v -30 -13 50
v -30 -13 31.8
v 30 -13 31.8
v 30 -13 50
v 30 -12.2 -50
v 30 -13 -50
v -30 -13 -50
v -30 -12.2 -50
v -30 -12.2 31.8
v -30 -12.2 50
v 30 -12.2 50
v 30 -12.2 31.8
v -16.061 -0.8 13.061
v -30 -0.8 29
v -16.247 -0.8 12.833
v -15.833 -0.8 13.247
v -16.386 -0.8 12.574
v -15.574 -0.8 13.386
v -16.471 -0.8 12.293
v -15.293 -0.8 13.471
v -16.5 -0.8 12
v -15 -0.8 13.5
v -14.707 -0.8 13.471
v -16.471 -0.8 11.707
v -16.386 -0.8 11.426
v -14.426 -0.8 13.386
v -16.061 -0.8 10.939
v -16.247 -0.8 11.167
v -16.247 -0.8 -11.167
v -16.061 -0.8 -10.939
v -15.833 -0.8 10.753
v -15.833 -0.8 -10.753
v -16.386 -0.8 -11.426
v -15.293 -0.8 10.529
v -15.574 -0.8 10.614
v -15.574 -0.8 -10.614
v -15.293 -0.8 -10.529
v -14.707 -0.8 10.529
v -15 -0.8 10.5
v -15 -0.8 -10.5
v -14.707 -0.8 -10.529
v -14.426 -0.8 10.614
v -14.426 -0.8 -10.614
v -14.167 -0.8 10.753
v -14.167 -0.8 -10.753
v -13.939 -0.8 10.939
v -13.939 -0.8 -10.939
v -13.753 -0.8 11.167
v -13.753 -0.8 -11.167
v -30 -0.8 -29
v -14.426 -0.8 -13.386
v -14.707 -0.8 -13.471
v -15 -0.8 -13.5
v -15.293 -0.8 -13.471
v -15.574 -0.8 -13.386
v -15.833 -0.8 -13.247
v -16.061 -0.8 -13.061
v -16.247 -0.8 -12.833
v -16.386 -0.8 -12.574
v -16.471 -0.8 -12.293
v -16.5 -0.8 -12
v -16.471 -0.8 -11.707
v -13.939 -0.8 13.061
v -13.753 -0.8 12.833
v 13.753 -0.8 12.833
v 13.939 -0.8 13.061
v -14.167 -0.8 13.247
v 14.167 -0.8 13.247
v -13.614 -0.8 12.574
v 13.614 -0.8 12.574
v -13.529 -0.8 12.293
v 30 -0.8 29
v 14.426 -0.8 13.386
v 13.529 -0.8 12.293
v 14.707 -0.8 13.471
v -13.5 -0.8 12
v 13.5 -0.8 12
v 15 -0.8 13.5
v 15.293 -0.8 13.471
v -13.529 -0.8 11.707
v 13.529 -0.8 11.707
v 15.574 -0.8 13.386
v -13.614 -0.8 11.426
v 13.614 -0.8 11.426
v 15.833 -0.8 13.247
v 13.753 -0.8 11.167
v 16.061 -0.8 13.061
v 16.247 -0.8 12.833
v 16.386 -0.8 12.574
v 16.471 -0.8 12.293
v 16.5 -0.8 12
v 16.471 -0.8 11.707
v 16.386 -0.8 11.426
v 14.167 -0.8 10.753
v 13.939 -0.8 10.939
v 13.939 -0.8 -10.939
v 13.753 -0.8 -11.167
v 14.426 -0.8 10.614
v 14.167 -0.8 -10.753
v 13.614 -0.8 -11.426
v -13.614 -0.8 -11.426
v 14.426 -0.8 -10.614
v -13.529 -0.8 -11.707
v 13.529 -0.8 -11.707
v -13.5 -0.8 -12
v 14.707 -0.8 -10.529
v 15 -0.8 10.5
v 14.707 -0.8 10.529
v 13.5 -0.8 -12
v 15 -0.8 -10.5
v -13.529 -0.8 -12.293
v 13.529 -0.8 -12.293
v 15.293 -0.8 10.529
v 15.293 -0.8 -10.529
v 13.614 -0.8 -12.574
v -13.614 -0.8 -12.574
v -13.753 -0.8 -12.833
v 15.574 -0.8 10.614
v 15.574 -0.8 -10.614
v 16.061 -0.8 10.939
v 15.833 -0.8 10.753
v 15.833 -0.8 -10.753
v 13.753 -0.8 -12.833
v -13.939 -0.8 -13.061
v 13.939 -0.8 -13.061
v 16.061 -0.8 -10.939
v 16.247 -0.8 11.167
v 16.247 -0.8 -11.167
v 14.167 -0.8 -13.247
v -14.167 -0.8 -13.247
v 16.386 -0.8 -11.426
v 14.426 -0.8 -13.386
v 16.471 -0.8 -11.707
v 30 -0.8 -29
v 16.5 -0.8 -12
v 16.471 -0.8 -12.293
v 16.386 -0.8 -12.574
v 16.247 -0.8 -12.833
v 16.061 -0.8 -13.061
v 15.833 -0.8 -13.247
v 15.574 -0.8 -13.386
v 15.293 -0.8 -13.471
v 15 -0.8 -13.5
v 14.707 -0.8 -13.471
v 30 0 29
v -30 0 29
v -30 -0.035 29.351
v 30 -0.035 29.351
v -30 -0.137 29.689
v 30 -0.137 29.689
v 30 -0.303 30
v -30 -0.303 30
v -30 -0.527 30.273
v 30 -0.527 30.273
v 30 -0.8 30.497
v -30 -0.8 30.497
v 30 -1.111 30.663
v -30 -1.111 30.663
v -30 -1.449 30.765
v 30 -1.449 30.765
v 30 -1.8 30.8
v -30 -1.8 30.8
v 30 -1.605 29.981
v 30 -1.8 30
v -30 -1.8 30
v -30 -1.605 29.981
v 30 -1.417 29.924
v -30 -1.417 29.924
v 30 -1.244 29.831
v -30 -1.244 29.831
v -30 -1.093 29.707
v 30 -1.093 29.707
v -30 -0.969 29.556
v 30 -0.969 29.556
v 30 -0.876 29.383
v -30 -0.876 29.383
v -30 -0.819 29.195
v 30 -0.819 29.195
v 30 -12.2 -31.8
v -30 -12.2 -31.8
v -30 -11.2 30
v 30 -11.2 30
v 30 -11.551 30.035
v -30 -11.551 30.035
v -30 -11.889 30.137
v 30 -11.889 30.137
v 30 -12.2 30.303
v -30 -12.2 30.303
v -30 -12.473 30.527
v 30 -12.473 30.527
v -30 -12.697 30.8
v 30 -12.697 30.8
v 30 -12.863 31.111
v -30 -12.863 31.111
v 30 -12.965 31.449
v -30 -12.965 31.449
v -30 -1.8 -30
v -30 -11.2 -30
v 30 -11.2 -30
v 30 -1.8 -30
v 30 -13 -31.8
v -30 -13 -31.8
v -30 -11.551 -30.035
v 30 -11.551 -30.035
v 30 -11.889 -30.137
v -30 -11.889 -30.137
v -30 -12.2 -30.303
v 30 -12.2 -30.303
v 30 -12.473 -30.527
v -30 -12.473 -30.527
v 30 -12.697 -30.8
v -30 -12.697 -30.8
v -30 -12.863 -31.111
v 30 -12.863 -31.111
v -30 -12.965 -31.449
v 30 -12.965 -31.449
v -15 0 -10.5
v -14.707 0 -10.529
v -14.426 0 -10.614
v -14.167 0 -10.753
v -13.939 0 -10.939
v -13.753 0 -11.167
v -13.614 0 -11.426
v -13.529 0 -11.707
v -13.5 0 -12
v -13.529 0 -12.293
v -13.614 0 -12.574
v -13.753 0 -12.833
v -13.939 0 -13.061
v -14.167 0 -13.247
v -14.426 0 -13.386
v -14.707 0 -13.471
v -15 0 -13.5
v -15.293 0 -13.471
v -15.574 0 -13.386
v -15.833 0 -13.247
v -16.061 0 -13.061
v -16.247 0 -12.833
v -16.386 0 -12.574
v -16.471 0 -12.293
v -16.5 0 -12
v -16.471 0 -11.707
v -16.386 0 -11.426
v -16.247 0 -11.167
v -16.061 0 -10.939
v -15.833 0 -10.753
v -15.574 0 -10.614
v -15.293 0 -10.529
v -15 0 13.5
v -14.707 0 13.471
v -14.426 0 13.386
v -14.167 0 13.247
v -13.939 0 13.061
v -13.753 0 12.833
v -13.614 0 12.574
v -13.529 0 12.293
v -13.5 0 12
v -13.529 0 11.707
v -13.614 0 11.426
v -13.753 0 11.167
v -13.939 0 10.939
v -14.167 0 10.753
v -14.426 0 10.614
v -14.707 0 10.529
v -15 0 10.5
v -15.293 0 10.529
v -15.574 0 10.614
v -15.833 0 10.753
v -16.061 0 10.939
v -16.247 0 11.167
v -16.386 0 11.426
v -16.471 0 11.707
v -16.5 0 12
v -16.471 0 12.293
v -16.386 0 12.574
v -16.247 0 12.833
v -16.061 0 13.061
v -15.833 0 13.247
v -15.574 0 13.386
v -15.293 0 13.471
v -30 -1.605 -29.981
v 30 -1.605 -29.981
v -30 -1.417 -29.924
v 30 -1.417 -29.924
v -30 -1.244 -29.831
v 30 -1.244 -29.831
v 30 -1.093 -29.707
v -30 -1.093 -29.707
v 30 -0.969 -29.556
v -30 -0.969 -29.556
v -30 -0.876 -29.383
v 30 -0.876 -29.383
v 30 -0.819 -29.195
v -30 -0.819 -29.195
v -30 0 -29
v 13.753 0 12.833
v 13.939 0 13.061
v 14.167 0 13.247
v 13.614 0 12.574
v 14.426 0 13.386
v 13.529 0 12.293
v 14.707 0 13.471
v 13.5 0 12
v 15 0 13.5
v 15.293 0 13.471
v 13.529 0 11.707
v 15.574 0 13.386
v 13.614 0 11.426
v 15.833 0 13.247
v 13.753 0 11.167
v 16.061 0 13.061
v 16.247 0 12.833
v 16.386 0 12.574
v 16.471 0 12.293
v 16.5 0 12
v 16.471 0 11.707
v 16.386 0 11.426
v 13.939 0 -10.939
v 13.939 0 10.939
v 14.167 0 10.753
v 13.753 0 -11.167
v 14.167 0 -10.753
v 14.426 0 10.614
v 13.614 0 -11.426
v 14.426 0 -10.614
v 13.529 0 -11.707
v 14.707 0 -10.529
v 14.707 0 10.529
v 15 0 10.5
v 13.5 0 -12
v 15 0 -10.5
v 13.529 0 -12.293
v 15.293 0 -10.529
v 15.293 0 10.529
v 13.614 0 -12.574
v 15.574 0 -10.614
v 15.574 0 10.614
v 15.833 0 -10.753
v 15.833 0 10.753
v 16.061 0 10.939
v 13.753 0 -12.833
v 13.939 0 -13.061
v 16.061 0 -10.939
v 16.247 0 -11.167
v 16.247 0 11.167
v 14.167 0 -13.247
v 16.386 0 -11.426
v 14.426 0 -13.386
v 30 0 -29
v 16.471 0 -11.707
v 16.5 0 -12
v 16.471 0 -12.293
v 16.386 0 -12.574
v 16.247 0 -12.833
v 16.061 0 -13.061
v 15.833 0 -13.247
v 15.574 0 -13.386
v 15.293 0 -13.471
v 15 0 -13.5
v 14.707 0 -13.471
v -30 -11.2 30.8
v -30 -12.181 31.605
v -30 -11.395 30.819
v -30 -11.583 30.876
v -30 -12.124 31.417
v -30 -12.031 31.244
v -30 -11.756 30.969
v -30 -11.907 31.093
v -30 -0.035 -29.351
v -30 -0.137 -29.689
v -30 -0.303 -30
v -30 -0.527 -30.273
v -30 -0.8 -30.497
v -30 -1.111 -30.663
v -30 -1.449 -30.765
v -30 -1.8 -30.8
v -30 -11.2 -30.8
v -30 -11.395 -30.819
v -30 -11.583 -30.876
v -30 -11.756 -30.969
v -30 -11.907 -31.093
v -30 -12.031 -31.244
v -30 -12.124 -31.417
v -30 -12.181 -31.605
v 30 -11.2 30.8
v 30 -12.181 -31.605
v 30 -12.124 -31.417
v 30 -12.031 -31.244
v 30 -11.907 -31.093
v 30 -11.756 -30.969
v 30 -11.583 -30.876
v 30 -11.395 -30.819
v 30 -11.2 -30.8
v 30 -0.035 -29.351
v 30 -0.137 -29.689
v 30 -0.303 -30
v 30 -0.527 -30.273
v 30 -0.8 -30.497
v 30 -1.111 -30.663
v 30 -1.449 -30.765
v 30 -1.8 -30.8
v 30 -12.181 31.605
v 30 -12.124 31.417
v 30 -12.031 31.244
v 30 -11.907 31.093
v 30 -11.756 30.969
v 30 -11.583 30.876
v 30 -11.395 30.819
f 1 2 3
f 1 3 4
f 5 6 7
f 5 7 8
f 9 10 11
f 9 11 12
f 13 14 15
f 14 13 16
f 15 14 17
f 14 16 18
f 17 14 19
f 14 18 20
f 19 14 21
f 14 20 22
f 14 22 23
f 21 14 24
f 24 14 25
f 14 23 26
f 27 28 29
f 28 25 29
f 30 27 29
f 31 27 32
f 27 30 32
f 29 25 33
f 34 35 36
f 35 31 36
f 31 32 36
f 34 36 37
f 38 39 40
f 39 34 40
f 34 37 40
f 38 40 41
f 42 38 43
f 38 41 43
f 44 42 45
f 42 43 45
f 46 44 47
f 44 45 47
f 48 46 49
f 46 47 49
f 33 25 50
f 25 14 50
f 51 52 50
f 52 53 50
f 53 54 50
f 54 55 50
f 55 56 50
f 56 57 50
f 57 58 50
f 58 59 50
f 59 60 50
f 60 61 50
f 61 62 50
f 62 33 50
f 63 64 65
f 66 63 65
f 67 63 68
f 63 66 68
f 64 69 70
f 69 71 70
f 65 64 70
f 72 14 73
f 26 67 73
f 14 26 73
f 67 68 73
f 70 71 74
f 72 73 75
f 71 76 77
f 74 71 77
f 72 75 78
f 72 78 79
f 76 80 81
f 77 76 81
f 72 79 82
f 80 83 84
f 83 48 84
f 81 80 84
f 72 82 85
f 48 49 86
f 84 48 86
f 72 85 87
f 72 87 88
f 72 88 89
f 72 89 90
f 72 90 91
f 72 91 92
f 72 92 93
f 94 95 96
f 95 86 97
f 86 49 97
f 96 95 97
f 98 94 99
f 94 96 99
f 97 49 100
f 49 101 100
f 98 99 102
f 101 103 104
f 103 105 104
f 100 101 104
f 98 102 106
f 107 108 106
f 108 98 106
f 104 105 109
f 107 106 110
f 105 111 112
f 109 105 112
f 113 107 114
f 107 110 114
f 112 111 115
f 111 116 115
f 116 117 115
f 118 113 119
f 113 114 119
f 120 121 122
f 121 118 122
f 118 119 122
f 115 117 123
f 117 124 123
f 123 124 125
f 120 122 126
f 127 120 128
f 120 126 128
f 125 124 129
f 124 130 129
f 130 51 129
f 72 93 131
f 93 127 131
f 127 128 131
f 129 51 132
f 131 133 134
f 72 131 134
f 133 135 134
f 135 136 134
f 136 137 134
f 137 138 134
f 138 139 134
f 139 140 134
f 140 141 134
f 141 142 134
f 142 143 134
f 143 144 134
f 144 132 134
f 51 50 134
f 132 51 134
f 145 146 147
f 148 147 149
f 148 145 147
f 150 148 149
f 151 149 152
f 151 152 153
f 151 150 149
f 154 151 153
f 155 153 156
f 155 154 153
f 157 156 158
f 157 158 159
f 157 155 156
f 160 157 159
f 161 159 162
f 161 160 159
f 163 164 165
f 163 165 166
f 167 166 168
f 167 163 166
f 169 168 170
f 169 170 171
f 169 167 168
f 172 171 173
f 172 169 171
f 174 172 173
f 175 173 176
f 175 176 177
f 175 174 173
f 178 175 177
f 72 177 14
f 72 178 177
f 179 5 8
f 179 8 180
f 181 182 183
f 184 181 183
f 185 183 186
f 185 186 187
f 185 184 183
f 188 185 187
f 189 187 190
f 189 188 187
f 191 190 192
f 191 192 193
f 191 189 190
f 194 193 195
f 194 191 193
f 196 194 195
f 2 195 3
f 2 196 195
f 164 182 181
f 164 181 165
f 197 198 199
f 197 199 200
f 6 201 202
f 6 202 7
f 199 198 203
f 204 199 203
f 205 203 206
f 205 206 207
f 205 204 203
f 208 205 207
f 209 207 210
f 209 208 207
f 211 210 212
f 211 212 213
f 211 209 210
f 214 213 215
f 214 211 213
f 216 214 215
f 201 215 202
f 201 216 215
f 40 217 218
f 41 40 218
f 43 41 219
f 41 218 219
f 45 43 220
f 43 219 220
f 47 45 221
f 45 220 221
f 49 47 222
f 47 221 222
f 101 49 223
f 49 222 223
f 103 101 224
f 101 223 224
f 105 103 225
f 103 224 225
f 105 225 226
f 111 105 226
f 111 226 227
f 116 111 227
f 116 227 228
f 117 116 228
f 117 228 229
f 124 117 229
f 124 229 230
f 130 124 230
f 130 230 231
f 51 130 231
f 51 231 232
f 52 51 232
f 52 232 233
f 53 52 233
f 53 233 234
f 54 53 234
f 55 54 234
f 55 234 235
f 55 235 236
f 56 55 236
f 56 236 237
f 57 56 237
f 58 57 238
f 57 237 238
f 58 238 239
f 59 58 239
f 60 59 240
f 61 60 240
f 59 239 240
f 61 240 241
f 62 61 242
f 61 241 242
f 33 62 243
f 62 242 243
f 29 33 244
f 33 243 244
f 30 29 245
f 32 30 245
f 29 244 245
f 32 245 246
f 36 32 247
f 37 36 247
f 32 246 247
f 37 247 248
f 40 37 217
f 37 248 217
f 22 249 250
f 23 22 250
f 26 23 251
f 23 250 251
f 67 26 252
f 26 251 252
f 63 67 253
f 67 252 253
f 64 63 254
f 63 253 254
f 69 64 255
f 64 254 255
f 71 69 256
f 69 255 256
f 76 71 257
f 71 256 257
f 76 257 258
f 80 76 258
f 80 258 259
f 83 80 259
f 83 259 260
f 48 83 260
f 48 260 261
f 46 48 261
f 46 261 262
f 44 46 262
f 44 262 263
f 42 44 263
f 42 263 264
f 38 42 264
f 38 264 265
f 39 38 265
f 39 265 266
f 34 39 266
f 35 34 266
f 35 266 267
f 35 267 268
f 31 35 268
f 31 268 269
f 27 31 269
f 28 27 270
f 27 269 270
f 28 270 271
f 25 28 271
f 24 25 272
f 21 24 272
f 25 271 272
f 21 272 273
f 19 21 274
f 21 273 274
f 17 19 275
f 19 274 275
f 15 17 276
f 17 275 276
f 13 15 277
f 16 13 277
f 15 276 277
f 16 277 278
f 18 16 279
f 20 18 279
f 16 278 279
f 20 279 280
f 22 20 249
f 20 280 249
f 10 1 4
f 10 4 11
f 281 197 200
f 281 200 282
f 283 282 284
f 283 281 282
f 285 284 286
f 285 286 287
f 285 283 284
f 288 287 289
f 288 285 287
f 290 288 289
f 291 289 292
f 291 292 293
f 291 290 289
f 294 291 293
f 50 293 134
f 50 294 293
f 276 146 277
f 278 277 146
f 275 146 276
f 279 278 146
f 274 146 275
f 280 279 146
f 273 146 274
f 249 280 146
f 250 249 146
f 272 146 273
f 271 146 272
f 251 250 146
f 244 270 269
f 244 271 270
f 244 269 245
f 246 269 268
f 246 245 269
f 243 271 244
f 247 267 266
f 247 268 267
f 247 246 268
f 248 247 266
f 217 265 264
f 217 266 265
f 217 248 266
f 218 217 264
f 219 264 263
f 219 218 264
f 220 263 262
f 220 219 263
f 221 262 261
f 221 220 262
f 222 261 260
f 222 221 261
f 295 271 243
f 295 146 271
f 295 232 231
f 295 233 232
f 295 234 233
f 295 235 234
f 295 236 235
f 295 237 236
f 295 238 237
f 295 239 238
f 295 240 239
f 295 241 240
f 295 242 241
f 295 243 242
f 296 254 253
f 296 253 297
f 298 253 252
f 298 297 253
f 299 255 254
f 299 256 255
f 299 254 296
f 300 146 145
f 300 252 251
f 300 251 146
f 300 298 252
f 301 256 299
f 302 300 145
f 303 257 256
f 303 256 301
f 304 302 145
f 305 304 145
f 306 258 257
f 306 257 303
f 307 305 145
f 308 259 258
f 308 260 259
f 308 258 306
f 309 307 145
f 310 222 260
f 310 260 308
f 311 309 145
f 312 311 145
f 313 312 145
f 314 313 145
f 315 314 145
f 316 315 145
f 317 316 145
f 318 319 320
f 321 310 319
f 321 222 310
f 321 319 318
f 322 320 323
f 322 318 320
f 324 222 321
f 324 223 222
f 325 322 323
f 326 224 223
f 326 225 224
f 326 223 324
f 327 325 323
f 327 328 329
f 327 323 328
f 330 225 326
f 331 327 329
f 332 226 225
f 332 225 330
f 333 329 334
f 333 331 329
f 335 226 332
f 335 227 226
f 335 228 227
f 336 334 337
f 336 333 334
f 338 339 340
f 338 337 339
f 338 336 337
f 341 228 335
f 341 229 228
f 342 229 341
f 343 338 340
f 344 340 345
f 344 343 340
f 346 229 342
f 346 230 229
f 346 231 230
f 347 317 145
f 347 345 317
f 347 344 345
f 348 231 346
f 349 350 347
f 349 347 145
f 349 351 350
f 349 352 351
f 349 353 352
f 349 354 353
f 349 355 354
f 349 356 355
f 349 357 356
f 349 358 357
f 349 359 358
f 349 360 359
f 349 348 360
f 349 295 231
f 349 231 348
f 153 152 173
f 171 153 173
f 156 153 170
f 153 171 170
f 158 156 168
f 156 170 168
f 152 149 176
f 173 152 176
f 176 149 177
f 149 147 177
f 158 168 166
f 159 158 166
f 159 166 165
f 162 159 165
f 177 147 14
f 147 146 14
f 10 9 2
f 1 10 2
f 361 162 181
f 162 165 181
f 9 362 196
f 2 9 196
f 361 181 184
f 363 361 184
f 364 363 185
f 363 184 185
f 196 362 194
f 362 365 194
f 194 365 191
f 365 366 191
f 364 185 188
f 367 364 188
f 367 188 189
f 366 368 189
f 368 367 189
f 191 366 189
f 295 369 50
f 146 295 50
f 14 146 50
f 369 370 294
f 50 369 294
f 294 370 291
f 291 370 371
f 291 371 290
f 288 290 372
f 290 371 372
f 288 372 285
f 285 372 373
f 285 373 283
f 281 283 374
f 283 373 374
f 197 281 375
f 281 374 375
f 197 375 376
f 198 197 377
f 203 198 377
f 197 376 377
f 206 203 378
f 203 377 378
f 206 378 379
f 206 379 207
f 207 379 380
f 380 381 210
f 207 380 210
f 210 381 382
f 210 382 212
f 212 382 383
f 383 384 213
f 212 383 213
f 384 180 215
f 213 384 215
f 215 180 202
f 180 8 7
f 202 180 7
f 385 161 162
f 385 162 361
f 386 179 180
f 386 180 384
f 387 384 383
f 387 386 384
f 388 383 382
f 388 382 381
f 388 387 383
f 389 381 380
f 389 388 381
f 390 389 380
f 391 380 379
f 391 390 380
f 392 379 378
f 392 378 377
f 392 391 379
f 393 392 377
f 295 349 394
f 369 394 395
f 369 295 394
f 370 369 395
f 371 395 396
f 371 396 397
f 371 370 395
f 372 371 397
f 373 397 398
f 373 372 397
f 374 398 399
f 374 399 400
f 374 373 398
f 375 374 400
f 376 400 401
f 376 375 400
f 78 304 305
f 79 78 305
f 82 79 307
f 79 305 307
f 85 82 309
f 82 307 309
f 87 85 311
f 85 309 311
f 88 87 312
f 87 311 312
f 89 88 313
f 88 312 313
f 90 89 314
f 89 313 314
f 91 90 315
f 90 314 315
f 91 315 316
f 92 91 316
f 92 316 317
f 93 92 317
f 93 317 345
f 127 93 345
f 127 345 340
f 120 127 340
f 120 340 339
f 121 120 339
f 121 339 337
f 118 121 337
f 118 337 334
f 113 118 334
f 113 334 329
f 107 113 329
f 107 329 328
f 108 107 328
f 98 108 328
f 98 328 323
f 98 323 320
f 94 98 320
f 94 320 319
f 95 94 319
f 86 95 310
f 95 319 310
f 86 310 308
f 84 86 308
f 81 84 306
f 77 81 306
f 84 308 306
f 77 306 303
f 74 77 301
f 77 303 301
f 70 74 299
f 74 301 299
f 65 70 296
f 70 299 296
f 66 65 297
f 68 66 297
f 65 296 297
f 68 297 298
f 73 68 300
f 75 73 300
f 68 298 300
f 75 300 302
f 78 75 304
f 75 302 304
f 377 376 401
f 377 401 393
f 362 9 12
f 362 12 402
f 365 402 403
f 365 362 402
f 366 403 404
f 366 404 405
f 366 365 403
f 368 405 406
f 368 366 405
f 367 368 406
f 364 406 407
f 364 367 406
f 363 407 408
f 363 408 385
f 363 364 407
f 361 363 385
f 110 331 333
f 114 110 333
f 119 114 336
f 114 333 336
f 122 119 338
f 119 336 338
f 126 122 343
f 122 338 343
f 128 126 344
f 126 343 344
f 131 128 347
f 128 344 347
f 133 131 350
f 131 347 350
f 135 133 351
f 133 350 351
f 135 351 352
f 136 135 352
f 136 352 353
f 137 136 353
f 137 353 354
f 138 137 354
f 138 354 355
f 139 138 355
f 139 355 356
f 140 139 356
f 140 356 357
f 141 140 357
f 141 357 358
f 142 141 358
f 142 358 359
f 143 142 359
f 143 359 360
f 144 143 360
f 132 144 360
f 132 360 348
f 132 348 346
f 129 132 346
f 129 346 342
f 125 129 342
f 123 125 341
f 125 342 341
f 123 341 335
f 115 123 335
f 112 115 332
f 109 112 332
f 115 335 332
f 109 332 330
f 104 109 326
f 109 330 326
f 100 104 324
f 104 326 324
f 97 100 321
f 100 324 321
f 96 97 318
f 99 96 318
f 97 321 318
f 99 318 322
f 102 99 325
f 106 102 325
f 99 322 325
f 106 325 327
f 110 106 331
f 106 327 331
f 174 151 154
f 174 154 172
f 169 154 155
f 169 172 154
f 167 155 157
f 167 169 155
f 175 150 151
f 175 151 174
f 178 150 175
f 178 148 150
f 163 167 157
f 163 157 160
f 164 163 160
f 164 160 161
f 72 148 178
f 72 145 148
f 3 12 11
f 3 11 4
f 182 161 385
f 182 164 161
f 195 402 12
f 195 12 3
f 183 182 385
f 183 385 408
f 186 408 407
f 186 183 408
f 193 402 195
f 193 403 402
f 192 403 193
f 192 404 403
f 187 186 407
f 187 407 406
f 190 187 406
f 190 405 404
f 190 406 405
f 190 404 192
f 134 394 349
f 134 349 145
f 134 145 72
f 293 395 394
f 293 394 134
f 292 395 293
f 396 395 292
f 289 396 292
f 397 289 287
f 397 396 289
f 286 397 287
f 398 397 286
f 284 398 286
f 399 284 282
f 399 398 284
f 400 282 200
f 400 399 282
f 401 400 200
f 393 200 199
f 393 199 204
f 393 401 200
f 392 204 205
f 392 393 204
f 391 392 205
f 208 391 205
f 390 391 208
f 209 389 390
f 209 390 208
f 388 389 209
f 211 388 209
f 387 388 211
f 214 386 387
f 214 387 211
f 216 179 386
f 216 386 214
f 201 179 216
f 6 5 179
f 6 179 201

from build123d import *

# Parameters (mm, degrees)
SKETCH7_W                      = 60
SKETCH7_H                      = 60
BASE_FLANGE2_DEPTH             = 0.8
EDGE_FLANGE1_STRIP_W           = 5.2
EDGE_FLANGE1_STRIP_H           = 0.8
EDGE_FLANGE1_STRIP_CUT_DEPTH   = 60
EDGE_FLANGE1_STRIP_2_W         = 5.2
EDGE_FLANGE1_STRIP_2_H         = 0.8
EDGE_FLANGE1_STRIP_CUT_2_DEPTH = 60
EDGE_FLANGE1_DEPTH             = 60
EDGE_FLANGE1_BEND_DEPTH        = 60
EDGE_FLANGE2_STRIP_W           = 5.2
EDGE_FLANGE2_STRIP_H           = 0.8
EDGE_FLANGE2_STRIP_CUT_DEPTH   = 60
EDGE_FLANGE2_STRIP_2_W         = 5.2
EDGE_FLANGE2_STRIP_2_H         = 0.8
EDGE_FLANGE2_STRIP_CUT_2_DEPTH = 60
EDGE_FLANGE2_DEPTH             = 60
EDGE_FLANGE2_BEND_DEPTH        = 60
SKETCH22_R                     = 1.5
CUT_EXTRUDE2_DEPTH             = 60.741108125


# Sheet-metal steps are written as plain solids
with BuildPart() as part:
    # Sketch7 → Base-Flange2 (new body)
    with BuildSketch(Plane(origin=(0, 0, 0), x_dir=(1, 0, 0), z_dir=(0, 1, 0))):
        Rectangle(SKETCH7_W, SKETCH7_H)
    extrude(amount=-BASE_FLANGE2_DEPTH)

    # Edge-Flange1 strip (across the edge) → Edge-Flange1 strip cut (cut)
    with BuildSketch(Plane(origin=(-30, -0.8, -30), x_dir=(0, 0, 1), z_dir=(1, 0, 0))):
        with Locations((-1.6, -0.4)):
            Rectangle(EDGE_FLANGE1_STRIP_W, EDGE_FLANGE1_STRIP_H)
    extrude(amount=EDGE_FLANGE1_STRIP_CUT_DEPTH, mode=Mode.SUBTRACT)

    # Edge-Flange1 strip 2 (across the edge) → Edge-Flange1 strip cut 2 (cut)
    with BuildSketch(Plane(origin=(30, -0.8, 30), x_dir=(0, 0, -1), z_dir=(-1, 0, 0))):
        with Locations((-1.6, -0.4)):
            Rectangle(EDGE_FLANGE1_STRIP_2_W, EDGE_FLANGE1_STRIP_2_H)
    extrude(amount=EDGE_FLANGE1_STRIP_CUT_2_DEPTH, mode=Mode.SUBTRACT)

    # Edge-Flange1 section (across the edge) → Edge-Flange1 (add)
    with BuildSketch(Plane(origin=(-30, -0.8, -30), x_dir=(0, 0, 1), z_dir=(1, 0, 0))):
        with BuildLine():
            Line((-0.8, 1), (-0.8, 12.2))
            Line((-0.8, 12.2), (0, 12.2))
            Line((0, 12.2), (0, 1))
            ThreePointArc((0, 1), (0.292893219, 0.292893219), (1, 0))
            Line((1, 0), (1, -0.8))
            ThreePointArc((1, -0.8), (-0.272792206, -0.272792206), (-0.8, 1))
        make_face()
    extrude(amount=EDGE_FLANGE1_DEPTH)

    # Edge-Flange1 section 2 (across the edge) → Edge-Flange1 bend (add)
    with BuildSketch(Plane(origin=(30, -0.8, 30), x_dir=(0, 0, -1), z_dir=(-1, 0, 0))):
        with BuildLine():
            Line((-0.8, 1), (-0.8, 12.2))
            Line((-0.8, 12.2), (0, 12.2))
            Line((0, 12.2), (0, 1))
            ThreePointArc((0, 1), (0.292893219, 0.292893219), (1, 0))
            Line((1, 0), (1, -0.8))
            ThreePointArc((1, -0.8), (-0.272792206, -0.272792206), (-0.8, 1))
        make_face()
    extrude(amount=EDGE_FLANGE1_BEND_DEPTH)

    # Edge-Flange2 strip (across the edge) → Edge-Flange2 strip cut (cut)
    with BuildSketch(Plane(origin=(-30, -13, 30.8), x_dir=(0, 1, 0), z_dir=(1, 0, 0))):
        with Locations((-0.8, -0.4)):
            Rectangle(EDGE_FLANGE2_STRIP_W, EDGE_FLANGE2_STRIP_H)
    extrude(amount=EDGE_FLANGE2_STRIP_CUT_DEPTH, mode=Mode.SUBTRACT)

    # Edge-Flange2 strip 2 (across the edge) → Edge-Flange2 strip cut 2 (cut)
    with BuildSketch(Plane(origin=(30, -13, -30.8), x_dir=(0, 1, 0), z_dir=(-1, 0, 0))):
        with Locations((-0.8, -0.4)):
            Rectangle(EDGE_FLANGE2_STRIP_2_W, EDGE_FLANGE2_STRIP_2_H)
    extrude(amount=EDGE_FLANGE2_STRIP_CUT_2_DEPTH, mode=Mode.SUBTRACT)

    # Edge-Flange2 section (across the edge) → Edge-Flange2 (add)
    with BuildSketch(Plane(origin=(-30, -13, 30.8), x_dir=(0, 1, 0), z_dir=(1, 0, 0))):
        with BuildLine():
            Line((0, 1), (0, 19.2))
            Line((0, 19.2), (0.8, 19.2))
            Line((0.8, 19.2), (0.8, 1))
            ThreePointArc((0.8, 1), (1.092893219, 0.292893219), (1.8, 0))
            Line((1.8, 0), (1.8, -0.8))
            ThreePointArc((1.8, -0.8), (0.527207794, -0.272792206), (0, 1))
        make_face()
    extrude(amount=EDGE_FLANGE2_DEPTH)

    # Edge-Flange2 section 2 (across the edge) → Edge-Flange2 bend (add)
    with BuildSketch(Plane(origin=(30, -13, -30.8), x_dir=(0, 1, 0), z_dir=(-1, 0, 0))):
        with BuildLine():
            Line((0, 1), (0, 19.2))
            Line((0, 19.2), (0.8, 19.2))
            Line((0.8, 19.2), (0.8, 1))
            ThreePointArc((0.8, 1), (1.092893219, 0.292893219), (1.8, 0))
            Line((1.8, 0), (1.8, -0.8))
            ThreePointArc((1.8, -0.8), (0.527207794, -0.272792206), (0, 1))
        make_face()
    extrude(amount=EDGE_FLANGE2_BEND_DEPTH)

    # Sketch22 → Cut-Extrude2 (cut, through all)
    with BuildSketch(Plane(origin=(0, 0, 0), x_dir=(1, 0, 0), z_dir=(0, 1, 0))):
        with Locations(Location((-15, 12, 0), (0, 0, 270))):
            Circle(SKETCH22_R)
        with Locations(Location((15, 12, 0), (0, 0, 270))):
            Circle(SKETCH22_R)
        with Locations(Location((15, -12, 0), (0, 0, 270))):
            Circle(SKETCH22_R)
        with Locations(Location((-15, -12, 0), (0, 0, 270))):
            Circle(SKETCH22_R)
    extrude(amount=-CUT_EXTRUDE2_DEPTH, mode=Mode.SUBTRACT)


solid = part.part
